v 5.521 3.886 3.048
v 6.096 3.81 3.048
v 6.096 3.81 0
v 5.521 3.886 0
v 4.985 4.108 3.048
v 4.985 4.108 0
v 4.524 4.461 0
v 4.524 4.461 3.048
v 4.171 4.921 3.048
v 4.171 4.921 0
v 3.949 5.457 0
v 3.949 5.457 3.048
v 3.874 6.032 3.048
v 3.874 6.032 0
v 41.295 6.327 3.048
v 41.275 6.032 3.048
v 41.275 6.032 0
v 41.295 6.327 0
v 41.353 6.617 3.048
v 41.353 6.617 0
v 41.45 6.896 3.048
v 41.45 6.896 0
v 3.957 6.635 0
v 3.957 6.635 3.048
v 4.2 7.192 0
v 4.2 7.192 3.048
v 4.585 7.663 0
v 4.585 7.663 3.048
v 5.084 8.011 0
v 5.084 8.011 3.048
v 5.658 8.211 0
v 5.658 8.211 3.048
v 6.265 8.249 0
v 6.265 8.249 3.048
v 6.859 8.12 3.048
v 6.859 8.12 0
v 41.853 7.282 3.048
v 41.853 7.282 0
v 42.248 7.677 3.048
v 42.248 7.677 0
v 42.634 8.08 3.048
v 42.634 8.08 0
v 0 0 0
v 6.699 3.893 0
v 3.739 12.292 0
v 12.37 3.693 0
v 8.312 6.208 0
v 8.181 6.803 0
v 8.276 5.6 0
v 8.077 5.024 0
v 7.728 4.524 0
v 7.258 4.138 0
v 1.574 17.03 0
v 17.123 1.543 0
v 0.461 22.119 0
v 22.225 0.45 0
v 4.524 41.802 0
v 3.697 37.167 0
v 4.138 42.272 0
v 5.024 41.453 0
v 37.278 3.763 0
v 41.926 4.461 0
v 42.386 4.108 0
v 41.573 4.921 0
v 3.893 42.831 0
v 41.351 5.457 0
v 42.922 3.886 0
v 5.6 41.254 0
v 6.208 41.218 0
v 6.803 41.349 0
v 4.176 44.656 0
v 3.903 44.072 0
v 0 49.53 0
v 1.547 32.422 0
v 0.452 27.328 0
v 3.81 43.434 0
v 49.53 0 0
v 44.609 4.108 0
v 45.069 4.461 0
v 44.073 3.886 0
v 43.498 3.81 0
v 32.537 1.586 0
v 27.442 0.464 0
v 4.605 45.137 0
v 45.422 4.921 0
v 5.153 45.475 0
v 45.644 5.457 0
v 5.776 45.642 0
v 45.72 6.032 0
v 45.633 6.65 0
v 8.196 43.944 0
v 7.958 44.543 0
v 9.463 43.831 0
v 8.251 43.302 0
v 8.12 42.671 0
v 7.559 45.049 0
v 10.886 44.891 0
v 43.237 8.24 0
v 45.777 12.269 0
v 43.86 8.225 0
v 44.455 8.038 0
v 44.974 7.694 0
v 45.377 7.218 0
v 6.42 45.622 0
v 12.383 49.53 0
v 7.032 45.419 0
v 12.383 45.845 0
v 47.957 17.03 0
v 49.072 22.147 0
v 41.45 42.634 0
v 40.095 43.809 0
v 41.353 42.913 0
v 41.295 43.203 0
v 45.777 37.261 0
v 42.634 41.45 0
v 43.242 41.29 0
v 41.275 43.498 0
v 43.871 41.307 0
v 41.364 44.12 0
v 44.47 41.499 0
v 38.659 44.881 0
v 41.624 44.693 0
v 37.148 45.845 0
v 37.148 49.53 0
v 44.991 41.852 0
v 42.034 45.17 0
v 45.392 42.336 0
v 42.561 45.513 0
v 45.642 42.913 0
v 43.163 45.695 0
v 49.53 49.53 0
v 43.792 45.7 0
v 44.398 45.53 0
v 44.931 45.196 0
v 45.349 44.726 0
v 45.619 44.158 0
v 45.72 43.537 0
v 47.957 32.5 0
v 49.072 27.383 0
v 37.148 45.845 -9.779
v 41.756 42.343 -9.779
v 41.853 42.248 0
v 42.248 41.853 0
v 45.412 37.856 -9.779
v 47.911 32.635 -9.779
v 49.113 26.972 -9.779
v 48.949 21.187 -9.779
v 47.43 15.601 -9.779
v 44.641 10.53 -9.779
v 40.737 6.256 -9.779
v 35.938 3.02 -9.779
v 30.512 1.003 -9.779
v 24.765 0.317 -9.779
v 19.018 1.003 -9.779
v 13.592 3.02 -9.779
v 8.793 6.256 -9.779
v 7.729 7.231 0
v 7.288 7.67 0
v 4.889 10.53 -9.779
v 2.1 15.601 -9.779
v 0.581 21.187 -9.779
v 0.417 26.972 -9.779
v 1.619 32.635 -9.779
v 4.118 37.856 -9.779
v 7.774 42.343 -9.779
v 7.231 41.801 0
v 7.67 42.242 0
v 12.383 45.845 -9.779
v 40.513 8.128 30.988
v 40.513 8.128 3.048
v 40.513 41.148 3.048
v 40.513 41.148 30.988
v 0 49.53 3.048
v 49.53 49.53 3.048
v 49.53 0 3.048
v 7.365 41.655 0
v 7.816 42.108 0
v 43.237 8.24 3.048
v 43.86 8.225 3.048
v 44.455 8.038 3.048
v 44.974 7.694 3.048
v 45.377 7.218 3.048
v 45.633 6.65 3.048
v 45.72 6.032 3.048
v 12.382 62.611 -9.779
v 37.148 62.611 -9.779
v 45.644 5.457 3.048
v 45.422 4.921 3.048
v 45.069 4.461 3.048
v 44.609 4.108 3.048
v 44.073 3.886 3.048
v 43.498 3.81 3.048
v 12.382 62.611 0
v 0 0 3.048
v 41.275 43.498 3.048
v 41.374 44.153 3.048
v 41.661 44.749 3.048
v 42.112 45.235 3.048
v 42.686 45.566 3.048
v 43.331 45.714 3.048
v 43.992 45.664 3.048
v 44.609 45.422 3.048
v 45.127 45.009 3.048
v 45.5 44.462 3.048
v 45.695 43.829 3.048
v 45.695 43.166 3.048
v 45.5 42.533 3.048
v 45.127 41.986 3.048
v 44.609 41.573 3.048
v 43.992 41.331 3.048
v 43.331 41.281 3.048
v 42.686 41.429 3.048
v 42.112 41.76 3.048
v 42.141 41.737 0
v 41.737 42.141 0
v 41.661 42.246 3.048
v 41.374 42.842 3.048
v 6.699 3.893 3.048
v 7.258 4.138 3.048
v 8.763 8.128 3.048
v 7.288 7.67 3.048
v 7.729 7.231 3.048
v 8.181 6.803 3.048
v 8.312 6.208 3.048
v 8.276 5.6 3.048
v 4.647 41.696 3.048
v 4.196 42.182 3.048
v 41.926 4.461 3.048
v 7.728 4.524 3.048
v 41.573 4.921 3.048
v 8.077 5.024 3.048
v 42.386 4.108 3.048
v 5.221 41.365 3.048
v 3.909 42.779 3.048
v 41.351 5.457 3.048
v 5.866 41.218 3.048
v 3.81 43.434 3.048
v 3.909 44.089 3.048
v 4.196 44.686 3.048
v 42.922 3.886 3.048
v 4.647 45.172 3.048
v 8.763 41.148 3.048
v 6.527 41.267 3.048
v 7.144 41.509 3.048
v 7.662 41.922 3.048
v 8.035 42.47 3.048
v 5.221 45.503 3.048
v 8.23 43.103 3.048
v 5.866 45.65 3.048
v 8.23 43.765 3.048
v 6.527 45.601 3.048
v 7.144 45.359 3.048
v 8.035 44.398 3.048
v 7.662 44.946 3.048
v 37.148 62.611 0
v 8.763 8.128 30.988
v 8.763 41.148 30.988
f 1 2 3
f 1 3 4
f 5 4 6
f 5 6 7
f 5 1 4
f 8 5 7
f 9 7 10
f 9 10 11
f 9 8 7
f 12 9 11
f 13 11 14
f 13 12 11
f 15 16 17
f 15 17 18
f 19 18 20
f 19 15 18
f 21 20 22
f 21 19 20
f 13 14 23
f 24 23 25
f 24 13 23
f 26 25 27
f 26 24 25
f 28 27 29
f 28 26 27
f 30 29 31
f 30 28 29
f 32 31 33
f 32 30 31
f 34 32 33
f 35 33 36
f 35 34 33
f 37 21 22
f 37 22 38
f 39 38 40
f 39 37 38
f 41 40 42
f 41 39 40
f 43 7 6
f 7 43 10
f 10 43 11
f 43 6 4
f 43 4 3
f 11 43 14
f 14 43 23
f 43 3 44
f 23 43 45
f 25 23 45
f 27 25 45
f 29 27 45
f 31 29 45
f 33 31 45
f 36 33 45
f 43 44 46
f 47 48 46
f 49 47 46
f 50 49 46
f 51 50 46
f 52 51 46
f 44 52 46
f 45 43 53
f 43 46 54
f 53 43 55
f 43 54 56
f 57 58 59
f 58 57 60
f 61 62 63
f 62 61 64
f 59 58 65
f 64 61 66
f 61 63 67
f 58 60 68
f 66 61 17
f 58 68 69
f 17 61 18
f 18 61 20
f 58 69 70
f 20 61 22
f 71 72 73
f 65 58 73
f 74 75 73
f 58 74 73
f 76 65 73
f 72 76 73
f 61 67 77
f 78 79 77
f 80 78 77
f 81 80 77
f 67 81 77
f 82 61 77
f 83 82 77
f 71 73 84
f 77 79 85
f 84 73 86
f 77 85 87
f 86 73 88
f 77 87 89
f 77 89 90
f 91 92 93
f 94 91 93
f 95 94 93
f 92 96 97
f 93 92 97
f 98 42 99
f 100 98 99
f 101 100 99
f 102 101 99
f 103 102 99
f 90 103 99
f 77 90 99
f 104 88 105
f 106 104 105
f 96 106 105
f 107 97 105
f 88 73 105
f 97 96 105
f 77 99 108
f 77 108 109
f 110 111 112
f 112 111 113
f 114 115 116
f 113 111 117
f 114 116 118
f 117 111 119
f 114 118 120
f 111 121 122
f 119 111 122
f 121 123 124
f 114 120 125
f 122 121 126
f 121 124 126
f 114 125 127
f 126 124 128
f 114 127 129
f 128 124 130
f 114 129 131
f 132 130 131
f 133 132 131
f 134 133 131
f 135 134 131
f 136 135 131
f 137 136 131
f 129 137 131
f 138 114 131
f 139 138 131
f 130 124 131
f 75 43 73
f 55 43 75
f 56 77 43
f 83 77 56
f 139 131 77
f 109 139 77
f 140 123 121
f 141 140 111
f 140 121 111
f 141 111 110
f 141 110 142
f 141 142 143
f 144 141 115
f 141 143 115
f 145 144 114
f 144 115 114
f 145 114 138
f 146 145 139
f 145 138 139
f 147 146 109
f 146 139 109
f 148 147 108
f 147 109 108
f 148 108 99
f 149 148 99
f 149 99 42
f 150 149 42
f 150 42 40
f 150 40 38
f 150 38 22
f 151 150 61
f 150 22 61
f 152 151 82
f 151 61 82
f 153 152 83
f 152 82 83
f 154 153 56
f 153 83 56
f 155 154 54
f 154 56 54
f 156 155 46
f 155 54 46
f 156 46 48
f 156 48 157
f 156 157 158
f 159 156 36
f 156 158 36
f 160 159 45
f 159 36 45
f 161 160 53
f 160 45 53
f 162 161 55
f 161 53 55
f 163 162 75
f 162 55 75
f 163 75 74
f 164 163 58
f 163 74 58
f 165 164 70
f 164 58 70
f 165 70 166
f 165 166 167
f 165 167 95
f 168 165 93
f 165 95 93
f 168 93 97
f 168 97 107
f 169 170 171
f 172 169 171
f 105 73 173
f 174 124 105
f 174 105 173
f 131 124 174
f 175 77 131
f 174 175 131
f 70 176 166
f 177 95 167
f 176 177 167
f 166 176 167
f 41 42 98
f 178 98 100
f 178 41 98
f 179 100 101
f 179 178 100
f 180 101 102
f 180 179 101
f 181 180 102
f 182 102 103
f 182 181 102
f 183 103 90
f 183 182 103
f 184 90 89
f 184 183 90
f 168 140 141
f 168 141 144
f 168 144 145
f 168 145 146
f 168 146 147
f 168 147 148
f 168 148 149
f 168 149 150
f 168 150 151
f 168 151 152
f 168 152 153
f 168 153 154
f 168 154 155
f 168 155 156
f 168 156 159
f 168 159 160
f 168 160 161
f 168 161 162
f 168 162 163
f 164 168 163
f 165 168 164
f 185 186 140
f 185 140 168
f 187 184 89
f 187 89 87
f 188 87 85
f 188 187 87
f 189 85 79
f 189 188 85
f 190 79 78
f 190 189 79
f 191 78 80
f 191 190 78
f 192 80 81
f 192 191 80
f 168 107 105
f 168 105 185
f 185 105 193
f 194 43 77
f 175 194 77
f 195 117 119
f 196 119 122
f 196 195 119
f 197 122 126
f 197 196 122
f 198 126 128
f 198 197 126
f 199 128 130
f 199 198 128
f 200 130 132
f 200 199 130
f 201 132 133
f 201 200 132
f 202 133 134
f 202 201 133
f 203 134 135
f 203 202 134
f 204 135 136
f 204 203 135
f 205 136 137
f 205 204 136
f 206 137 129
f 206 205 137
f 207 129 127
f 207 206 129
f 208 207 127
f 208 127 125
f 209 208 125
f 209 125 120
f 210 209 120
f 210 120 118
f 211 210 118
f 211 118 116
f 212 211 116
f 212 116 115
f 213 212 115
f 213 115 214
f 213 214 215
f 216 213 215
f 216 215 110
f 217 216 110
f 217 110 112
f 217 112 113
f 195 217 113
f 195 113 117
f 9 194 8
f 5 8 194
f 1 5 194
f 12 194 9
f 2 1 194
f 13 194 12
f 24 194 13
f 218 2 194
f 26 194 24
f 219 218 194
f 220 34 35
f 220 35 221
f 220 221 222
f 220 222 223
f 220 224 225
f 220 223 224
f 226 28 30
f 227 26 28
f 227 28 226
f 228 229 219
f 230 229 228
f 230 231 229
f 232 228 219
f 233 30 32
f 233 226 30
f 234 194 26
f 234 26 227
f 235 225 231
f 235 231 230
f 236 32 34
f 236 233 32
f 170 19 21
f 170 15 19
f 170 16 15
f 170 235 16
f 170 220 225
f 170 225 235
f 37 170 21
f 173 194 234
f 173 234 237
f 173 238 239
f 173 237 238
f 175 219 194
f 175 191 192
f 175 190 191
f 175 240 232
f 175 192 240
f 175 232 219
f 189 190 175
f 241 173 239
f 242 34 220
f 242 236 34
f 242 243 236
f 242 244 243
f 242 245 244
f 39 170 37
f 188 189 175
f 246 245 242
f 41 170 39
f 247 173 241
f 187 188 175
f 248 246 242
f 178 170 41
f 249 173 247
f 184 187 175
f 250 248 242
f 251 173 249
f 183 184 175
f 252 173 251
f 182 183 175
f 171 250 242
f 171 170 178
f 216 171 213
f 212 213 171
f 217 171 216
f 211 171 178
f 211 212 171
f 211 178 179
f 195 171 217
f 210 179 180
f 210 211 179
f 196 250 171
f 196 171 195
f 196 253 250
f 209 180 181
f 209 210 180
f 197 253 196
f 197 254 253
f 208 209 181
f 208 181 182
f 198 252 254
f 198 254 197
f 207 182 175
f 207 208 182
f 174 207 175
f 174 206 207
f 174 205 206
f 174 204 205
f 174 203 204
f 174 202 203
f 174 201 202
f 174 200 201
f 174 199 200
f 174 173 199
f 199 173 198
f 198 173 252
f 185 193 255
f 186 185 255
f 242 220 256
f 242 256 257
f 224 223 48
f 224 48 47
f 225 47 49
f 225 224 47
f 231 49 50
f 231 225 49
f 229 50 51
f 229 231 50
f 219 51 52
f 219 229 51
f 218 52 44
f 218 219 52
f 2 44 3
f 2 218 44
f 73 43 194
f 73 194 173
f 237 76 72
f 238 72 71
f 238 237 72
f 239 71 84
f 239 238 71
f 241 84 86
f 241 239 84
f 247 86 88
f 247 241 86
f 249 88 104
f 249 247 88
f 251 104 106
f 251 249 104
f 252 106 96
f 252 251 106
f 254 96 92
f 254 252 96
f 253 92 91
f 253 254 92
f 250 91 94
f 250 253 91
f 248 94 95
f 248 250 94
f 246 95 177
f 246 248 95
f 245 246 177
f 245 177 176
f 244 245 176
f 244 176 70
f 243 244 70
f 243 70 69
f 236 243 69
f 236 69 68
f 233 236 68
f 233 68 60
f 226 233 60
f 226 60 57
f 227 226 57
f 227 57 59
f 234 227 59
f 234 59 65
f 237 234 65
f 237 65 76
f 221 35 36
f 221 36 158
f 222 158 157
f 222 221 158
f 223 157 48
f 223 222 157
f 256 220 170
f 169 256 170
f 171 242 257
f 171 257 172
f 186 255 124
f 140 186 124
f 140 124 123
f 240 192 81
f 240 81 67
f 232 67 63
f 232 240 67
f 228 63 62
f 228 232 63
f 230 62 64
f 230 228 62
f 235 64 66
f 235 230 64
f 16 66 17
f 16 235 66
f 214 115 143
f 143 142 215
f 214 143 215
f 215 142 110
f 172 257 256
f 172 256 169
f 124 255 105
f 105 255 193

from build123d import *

# Parameters (mm, degrees)
SKETCH1_W           = 49.53
SKETCH1_H           = 49.53
BOSS_EXTRUDE1_DEPTH = 3.048
SKETCH2_R           = 24.4475
BOSS_EXTRUDE2_DEPTH = 9.779
CUT_EXTRUDE1_START  = -9.779
SKETCH3_R           = 2.2225
CUT_EXTRUDE1_DEPTH  = 9.779
SKETCH4_W           = 31.75
SKETCH4_H           = 33.02
BOSS_EXTRUDE3_DEPTH = 27.94


with BuildPart() as part:
    # Sketch1 → Boss-Extrude1 (new body)
    with BuildSketch(Plane.XY):
        with Locations((24.765, 24.765)):
            Rectangle(SKETCH1_W, SKETCH1_H)
    extrude(amount=BOSS_EXTRUDE1_DEPTH)

    # Sketch2 → Boss-Extrude2 (add)
    with BuildSketch(Plane(origin=(0, 0, 0), x_dir=(-1, 0, 0), z_dir=(0, 0, -1))):
        Polygon((-37.1475, 49.53), (-24.765, 49.53), (-12.3825, 49.53), (-12.3825, 62.611), (-37.1475, 62.611), align=None)
        with BuildLine():
            Line((-12.3825, 49.53), (-24.765, 49.53))
            Line((-24.765, 49.53), (-37.1475, 49.53))
            Line((-37.1475, 49.53), (-37.1475, 45.844704694))
            ThreePointArc((-37.1475, 45.844704694), (-24.765, 49.2125), (-12.3825, 45.844704694))
            Line((-12.3825, 45.844704694), (-12.3825, 49.53))
        make_face()
        with Locations((-24.765, 24.765)):
            Circle(SKETCH2_R)
    extrude(amount=BOSS_EXTRUDE2_DEPTH)

    # Sketch3 → Cut-Extrude1 (cut)
    with BuildSketch(Plane(origin=(0, 0, 0), x_dir=(-1, 0, 0), z_dir=(0, 0, -1)).offset(CUT_EXTRUDE1_START)):
        with BuildLine():
            ThreePointArc((-41.449545605, 6.895859165), (-42.051993033, 7.478006967), (-42.634140835, 8.080454395))
            ThreePointArc((-42.634140835, 8.080454395), (-44.726461046, 7.884299394), (-45.72, 6.0325))
            Line((-45.72, 6.0325), (-43.4975, 6.0325))
            Line((-43.4975, 6.0325), (-43.4975, 3.81))
            ThreePointArc((-43.4975, 3.81), (-41.925955179, 4.460955179), (-41.275, 6.0325))
            ThreePointArc((-41.275, 6.0325), (-41.319073401, 6.472913219), (-41.449545605, 6.895859165))
        make_face()
        with BuildLine():
            Line((-43.4975, 6.0325), (-45.72, 6.0325))
            ThreePointArc((-45.72, 6.0325), (-45.069044821, 4.460955179), (-43.4975, 3.81))
            Line((-43.4975, 3.81), (-43.4975, 6.0325))
        make_face()
        with BuildLine():
            ThreePointArc((-6.859133168, 8.119874911), (-7.507381573, 7.448682191), (-8.180771601, 6.802716608))
            ThreePointArc((-8.180771601, 6.802716608), (-7.919638213, 4.762126071), (-6.096, 3.81))
            Line((-6.096, 3.81), (-6.096, 6.0325))
            Line((-6.096, 6.0325), (-3.8735, 6.0325))
            ThreePointArc((-3.8735, 6.0325), (-4.822531747, 7.853978756), (-6.859133168, 8.119874911))
        make_face()
        with BuildLine():
            Line((-6.096, 6.0325), (-6.096, 3.81))
            ThreePointArc((-6.096, 3.81), (-4.524455179, 4.460955179), (-3.8735, 6.0325))
            Line((-3.8735, 6.0325), (-6.096, 6.0325))
        make_face()
        with Locations((-6.0325, 43.434)):
            Circle(SKETCH3_R)
        with Locations((-43.4975, 43.4975)):
            Circle(SKETCH3_R)
    extrude(amount=CUT_EXTRUDE1_DEPTH, mode=Mode.SUBTRACT)

    # Sketch4 → Boss-Extrude3 (add)
    with BuildSketch(Plane.XY.offset(3.048)):
        with Locations((24.638, 24.638)):
            Rectangle(SKETCH4_W, SKETCH4_H)
    extrude(amount=BOSS_EXTRUDE3_DEPTH)


solid = part.part
